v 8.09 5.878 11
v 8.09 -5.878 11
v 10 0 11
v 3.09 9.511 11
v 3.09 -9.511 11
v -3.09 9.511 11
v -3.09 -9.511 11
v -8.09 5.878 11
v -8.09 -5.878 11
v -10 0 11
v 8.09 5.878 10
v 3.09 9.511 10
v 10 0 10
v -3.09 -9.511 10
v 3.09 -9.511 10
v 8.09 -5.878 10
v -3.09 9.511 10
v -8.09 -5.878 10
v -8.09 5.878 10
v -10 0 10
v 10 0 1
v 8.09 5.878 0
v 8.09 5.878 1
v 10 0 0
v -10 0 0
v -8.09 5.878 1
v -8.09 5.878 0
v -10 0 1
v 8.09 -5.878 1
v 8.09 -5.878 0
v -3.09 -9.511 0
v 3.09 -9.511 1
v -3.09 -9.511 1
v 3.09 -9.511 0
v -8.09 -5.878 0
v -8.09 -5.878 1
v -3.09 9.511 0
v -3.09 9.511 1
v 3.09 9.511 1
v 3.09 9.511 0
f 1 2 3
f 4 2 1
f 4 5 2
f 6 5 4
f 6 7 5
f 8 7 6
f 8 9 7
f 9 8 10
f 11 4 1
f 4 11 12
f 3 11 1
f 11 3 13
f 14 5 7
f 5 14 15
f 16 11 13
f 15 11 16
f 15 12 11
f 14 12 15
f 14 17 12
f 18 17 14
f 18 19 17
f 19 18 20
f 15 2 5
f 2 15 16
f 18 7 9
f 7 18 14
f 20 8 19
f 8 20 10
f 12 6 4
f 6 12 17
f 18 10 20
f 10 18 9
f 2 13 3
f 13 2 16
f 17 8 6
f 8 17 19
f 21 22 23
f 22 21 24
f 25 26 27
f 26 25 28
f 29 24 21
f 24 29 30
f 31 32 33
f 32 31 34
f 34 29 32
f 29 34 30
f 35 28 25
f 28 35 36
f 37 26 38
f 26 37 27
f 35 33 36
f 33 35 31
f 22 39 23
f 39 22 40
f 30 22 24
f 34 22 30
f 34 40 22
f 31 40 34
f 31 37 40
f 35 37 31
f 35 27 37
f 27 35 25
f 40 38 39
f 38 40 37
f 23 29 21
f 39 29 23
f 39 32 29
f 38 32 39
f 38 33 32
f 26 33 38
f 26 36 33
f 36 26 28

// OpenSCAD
/**
 * Calculate the number of facets to generate for radius `r`. This is intended
 * to mimic OpenSCAD's internal get_fragments_from_r() function.
 *
 * @param r Radius of circle
 */
function get_fragments_from_r (r) = (
    ($fn > 0) ? $fn :
    (r < 0.00000095367431640625) ? 3 :
    ceil (max (min (360 / $fa, r * 2 * PI / $fs), 5))
);

/**
 * This is a function that generates a series of values ala $t for use as facet
 * IDs.
 *
 * @param r Radius of circle
 */
function gen_facet_series (r) = [0 : 1.0 / get_fragments_from_r (r) : 1.01];

// example
translate ([0, 0, 10])
linear_extrude (1)
circle (10, $fn = 10);

linear_extrude (1)
polygon (
    [
        let (r = 10)
        for (t = gen_facet_series (r, $fn = 10))
        let (angle = t * 360)
        [cos (angle) * r, sin (angle) * r]
    ]
);
